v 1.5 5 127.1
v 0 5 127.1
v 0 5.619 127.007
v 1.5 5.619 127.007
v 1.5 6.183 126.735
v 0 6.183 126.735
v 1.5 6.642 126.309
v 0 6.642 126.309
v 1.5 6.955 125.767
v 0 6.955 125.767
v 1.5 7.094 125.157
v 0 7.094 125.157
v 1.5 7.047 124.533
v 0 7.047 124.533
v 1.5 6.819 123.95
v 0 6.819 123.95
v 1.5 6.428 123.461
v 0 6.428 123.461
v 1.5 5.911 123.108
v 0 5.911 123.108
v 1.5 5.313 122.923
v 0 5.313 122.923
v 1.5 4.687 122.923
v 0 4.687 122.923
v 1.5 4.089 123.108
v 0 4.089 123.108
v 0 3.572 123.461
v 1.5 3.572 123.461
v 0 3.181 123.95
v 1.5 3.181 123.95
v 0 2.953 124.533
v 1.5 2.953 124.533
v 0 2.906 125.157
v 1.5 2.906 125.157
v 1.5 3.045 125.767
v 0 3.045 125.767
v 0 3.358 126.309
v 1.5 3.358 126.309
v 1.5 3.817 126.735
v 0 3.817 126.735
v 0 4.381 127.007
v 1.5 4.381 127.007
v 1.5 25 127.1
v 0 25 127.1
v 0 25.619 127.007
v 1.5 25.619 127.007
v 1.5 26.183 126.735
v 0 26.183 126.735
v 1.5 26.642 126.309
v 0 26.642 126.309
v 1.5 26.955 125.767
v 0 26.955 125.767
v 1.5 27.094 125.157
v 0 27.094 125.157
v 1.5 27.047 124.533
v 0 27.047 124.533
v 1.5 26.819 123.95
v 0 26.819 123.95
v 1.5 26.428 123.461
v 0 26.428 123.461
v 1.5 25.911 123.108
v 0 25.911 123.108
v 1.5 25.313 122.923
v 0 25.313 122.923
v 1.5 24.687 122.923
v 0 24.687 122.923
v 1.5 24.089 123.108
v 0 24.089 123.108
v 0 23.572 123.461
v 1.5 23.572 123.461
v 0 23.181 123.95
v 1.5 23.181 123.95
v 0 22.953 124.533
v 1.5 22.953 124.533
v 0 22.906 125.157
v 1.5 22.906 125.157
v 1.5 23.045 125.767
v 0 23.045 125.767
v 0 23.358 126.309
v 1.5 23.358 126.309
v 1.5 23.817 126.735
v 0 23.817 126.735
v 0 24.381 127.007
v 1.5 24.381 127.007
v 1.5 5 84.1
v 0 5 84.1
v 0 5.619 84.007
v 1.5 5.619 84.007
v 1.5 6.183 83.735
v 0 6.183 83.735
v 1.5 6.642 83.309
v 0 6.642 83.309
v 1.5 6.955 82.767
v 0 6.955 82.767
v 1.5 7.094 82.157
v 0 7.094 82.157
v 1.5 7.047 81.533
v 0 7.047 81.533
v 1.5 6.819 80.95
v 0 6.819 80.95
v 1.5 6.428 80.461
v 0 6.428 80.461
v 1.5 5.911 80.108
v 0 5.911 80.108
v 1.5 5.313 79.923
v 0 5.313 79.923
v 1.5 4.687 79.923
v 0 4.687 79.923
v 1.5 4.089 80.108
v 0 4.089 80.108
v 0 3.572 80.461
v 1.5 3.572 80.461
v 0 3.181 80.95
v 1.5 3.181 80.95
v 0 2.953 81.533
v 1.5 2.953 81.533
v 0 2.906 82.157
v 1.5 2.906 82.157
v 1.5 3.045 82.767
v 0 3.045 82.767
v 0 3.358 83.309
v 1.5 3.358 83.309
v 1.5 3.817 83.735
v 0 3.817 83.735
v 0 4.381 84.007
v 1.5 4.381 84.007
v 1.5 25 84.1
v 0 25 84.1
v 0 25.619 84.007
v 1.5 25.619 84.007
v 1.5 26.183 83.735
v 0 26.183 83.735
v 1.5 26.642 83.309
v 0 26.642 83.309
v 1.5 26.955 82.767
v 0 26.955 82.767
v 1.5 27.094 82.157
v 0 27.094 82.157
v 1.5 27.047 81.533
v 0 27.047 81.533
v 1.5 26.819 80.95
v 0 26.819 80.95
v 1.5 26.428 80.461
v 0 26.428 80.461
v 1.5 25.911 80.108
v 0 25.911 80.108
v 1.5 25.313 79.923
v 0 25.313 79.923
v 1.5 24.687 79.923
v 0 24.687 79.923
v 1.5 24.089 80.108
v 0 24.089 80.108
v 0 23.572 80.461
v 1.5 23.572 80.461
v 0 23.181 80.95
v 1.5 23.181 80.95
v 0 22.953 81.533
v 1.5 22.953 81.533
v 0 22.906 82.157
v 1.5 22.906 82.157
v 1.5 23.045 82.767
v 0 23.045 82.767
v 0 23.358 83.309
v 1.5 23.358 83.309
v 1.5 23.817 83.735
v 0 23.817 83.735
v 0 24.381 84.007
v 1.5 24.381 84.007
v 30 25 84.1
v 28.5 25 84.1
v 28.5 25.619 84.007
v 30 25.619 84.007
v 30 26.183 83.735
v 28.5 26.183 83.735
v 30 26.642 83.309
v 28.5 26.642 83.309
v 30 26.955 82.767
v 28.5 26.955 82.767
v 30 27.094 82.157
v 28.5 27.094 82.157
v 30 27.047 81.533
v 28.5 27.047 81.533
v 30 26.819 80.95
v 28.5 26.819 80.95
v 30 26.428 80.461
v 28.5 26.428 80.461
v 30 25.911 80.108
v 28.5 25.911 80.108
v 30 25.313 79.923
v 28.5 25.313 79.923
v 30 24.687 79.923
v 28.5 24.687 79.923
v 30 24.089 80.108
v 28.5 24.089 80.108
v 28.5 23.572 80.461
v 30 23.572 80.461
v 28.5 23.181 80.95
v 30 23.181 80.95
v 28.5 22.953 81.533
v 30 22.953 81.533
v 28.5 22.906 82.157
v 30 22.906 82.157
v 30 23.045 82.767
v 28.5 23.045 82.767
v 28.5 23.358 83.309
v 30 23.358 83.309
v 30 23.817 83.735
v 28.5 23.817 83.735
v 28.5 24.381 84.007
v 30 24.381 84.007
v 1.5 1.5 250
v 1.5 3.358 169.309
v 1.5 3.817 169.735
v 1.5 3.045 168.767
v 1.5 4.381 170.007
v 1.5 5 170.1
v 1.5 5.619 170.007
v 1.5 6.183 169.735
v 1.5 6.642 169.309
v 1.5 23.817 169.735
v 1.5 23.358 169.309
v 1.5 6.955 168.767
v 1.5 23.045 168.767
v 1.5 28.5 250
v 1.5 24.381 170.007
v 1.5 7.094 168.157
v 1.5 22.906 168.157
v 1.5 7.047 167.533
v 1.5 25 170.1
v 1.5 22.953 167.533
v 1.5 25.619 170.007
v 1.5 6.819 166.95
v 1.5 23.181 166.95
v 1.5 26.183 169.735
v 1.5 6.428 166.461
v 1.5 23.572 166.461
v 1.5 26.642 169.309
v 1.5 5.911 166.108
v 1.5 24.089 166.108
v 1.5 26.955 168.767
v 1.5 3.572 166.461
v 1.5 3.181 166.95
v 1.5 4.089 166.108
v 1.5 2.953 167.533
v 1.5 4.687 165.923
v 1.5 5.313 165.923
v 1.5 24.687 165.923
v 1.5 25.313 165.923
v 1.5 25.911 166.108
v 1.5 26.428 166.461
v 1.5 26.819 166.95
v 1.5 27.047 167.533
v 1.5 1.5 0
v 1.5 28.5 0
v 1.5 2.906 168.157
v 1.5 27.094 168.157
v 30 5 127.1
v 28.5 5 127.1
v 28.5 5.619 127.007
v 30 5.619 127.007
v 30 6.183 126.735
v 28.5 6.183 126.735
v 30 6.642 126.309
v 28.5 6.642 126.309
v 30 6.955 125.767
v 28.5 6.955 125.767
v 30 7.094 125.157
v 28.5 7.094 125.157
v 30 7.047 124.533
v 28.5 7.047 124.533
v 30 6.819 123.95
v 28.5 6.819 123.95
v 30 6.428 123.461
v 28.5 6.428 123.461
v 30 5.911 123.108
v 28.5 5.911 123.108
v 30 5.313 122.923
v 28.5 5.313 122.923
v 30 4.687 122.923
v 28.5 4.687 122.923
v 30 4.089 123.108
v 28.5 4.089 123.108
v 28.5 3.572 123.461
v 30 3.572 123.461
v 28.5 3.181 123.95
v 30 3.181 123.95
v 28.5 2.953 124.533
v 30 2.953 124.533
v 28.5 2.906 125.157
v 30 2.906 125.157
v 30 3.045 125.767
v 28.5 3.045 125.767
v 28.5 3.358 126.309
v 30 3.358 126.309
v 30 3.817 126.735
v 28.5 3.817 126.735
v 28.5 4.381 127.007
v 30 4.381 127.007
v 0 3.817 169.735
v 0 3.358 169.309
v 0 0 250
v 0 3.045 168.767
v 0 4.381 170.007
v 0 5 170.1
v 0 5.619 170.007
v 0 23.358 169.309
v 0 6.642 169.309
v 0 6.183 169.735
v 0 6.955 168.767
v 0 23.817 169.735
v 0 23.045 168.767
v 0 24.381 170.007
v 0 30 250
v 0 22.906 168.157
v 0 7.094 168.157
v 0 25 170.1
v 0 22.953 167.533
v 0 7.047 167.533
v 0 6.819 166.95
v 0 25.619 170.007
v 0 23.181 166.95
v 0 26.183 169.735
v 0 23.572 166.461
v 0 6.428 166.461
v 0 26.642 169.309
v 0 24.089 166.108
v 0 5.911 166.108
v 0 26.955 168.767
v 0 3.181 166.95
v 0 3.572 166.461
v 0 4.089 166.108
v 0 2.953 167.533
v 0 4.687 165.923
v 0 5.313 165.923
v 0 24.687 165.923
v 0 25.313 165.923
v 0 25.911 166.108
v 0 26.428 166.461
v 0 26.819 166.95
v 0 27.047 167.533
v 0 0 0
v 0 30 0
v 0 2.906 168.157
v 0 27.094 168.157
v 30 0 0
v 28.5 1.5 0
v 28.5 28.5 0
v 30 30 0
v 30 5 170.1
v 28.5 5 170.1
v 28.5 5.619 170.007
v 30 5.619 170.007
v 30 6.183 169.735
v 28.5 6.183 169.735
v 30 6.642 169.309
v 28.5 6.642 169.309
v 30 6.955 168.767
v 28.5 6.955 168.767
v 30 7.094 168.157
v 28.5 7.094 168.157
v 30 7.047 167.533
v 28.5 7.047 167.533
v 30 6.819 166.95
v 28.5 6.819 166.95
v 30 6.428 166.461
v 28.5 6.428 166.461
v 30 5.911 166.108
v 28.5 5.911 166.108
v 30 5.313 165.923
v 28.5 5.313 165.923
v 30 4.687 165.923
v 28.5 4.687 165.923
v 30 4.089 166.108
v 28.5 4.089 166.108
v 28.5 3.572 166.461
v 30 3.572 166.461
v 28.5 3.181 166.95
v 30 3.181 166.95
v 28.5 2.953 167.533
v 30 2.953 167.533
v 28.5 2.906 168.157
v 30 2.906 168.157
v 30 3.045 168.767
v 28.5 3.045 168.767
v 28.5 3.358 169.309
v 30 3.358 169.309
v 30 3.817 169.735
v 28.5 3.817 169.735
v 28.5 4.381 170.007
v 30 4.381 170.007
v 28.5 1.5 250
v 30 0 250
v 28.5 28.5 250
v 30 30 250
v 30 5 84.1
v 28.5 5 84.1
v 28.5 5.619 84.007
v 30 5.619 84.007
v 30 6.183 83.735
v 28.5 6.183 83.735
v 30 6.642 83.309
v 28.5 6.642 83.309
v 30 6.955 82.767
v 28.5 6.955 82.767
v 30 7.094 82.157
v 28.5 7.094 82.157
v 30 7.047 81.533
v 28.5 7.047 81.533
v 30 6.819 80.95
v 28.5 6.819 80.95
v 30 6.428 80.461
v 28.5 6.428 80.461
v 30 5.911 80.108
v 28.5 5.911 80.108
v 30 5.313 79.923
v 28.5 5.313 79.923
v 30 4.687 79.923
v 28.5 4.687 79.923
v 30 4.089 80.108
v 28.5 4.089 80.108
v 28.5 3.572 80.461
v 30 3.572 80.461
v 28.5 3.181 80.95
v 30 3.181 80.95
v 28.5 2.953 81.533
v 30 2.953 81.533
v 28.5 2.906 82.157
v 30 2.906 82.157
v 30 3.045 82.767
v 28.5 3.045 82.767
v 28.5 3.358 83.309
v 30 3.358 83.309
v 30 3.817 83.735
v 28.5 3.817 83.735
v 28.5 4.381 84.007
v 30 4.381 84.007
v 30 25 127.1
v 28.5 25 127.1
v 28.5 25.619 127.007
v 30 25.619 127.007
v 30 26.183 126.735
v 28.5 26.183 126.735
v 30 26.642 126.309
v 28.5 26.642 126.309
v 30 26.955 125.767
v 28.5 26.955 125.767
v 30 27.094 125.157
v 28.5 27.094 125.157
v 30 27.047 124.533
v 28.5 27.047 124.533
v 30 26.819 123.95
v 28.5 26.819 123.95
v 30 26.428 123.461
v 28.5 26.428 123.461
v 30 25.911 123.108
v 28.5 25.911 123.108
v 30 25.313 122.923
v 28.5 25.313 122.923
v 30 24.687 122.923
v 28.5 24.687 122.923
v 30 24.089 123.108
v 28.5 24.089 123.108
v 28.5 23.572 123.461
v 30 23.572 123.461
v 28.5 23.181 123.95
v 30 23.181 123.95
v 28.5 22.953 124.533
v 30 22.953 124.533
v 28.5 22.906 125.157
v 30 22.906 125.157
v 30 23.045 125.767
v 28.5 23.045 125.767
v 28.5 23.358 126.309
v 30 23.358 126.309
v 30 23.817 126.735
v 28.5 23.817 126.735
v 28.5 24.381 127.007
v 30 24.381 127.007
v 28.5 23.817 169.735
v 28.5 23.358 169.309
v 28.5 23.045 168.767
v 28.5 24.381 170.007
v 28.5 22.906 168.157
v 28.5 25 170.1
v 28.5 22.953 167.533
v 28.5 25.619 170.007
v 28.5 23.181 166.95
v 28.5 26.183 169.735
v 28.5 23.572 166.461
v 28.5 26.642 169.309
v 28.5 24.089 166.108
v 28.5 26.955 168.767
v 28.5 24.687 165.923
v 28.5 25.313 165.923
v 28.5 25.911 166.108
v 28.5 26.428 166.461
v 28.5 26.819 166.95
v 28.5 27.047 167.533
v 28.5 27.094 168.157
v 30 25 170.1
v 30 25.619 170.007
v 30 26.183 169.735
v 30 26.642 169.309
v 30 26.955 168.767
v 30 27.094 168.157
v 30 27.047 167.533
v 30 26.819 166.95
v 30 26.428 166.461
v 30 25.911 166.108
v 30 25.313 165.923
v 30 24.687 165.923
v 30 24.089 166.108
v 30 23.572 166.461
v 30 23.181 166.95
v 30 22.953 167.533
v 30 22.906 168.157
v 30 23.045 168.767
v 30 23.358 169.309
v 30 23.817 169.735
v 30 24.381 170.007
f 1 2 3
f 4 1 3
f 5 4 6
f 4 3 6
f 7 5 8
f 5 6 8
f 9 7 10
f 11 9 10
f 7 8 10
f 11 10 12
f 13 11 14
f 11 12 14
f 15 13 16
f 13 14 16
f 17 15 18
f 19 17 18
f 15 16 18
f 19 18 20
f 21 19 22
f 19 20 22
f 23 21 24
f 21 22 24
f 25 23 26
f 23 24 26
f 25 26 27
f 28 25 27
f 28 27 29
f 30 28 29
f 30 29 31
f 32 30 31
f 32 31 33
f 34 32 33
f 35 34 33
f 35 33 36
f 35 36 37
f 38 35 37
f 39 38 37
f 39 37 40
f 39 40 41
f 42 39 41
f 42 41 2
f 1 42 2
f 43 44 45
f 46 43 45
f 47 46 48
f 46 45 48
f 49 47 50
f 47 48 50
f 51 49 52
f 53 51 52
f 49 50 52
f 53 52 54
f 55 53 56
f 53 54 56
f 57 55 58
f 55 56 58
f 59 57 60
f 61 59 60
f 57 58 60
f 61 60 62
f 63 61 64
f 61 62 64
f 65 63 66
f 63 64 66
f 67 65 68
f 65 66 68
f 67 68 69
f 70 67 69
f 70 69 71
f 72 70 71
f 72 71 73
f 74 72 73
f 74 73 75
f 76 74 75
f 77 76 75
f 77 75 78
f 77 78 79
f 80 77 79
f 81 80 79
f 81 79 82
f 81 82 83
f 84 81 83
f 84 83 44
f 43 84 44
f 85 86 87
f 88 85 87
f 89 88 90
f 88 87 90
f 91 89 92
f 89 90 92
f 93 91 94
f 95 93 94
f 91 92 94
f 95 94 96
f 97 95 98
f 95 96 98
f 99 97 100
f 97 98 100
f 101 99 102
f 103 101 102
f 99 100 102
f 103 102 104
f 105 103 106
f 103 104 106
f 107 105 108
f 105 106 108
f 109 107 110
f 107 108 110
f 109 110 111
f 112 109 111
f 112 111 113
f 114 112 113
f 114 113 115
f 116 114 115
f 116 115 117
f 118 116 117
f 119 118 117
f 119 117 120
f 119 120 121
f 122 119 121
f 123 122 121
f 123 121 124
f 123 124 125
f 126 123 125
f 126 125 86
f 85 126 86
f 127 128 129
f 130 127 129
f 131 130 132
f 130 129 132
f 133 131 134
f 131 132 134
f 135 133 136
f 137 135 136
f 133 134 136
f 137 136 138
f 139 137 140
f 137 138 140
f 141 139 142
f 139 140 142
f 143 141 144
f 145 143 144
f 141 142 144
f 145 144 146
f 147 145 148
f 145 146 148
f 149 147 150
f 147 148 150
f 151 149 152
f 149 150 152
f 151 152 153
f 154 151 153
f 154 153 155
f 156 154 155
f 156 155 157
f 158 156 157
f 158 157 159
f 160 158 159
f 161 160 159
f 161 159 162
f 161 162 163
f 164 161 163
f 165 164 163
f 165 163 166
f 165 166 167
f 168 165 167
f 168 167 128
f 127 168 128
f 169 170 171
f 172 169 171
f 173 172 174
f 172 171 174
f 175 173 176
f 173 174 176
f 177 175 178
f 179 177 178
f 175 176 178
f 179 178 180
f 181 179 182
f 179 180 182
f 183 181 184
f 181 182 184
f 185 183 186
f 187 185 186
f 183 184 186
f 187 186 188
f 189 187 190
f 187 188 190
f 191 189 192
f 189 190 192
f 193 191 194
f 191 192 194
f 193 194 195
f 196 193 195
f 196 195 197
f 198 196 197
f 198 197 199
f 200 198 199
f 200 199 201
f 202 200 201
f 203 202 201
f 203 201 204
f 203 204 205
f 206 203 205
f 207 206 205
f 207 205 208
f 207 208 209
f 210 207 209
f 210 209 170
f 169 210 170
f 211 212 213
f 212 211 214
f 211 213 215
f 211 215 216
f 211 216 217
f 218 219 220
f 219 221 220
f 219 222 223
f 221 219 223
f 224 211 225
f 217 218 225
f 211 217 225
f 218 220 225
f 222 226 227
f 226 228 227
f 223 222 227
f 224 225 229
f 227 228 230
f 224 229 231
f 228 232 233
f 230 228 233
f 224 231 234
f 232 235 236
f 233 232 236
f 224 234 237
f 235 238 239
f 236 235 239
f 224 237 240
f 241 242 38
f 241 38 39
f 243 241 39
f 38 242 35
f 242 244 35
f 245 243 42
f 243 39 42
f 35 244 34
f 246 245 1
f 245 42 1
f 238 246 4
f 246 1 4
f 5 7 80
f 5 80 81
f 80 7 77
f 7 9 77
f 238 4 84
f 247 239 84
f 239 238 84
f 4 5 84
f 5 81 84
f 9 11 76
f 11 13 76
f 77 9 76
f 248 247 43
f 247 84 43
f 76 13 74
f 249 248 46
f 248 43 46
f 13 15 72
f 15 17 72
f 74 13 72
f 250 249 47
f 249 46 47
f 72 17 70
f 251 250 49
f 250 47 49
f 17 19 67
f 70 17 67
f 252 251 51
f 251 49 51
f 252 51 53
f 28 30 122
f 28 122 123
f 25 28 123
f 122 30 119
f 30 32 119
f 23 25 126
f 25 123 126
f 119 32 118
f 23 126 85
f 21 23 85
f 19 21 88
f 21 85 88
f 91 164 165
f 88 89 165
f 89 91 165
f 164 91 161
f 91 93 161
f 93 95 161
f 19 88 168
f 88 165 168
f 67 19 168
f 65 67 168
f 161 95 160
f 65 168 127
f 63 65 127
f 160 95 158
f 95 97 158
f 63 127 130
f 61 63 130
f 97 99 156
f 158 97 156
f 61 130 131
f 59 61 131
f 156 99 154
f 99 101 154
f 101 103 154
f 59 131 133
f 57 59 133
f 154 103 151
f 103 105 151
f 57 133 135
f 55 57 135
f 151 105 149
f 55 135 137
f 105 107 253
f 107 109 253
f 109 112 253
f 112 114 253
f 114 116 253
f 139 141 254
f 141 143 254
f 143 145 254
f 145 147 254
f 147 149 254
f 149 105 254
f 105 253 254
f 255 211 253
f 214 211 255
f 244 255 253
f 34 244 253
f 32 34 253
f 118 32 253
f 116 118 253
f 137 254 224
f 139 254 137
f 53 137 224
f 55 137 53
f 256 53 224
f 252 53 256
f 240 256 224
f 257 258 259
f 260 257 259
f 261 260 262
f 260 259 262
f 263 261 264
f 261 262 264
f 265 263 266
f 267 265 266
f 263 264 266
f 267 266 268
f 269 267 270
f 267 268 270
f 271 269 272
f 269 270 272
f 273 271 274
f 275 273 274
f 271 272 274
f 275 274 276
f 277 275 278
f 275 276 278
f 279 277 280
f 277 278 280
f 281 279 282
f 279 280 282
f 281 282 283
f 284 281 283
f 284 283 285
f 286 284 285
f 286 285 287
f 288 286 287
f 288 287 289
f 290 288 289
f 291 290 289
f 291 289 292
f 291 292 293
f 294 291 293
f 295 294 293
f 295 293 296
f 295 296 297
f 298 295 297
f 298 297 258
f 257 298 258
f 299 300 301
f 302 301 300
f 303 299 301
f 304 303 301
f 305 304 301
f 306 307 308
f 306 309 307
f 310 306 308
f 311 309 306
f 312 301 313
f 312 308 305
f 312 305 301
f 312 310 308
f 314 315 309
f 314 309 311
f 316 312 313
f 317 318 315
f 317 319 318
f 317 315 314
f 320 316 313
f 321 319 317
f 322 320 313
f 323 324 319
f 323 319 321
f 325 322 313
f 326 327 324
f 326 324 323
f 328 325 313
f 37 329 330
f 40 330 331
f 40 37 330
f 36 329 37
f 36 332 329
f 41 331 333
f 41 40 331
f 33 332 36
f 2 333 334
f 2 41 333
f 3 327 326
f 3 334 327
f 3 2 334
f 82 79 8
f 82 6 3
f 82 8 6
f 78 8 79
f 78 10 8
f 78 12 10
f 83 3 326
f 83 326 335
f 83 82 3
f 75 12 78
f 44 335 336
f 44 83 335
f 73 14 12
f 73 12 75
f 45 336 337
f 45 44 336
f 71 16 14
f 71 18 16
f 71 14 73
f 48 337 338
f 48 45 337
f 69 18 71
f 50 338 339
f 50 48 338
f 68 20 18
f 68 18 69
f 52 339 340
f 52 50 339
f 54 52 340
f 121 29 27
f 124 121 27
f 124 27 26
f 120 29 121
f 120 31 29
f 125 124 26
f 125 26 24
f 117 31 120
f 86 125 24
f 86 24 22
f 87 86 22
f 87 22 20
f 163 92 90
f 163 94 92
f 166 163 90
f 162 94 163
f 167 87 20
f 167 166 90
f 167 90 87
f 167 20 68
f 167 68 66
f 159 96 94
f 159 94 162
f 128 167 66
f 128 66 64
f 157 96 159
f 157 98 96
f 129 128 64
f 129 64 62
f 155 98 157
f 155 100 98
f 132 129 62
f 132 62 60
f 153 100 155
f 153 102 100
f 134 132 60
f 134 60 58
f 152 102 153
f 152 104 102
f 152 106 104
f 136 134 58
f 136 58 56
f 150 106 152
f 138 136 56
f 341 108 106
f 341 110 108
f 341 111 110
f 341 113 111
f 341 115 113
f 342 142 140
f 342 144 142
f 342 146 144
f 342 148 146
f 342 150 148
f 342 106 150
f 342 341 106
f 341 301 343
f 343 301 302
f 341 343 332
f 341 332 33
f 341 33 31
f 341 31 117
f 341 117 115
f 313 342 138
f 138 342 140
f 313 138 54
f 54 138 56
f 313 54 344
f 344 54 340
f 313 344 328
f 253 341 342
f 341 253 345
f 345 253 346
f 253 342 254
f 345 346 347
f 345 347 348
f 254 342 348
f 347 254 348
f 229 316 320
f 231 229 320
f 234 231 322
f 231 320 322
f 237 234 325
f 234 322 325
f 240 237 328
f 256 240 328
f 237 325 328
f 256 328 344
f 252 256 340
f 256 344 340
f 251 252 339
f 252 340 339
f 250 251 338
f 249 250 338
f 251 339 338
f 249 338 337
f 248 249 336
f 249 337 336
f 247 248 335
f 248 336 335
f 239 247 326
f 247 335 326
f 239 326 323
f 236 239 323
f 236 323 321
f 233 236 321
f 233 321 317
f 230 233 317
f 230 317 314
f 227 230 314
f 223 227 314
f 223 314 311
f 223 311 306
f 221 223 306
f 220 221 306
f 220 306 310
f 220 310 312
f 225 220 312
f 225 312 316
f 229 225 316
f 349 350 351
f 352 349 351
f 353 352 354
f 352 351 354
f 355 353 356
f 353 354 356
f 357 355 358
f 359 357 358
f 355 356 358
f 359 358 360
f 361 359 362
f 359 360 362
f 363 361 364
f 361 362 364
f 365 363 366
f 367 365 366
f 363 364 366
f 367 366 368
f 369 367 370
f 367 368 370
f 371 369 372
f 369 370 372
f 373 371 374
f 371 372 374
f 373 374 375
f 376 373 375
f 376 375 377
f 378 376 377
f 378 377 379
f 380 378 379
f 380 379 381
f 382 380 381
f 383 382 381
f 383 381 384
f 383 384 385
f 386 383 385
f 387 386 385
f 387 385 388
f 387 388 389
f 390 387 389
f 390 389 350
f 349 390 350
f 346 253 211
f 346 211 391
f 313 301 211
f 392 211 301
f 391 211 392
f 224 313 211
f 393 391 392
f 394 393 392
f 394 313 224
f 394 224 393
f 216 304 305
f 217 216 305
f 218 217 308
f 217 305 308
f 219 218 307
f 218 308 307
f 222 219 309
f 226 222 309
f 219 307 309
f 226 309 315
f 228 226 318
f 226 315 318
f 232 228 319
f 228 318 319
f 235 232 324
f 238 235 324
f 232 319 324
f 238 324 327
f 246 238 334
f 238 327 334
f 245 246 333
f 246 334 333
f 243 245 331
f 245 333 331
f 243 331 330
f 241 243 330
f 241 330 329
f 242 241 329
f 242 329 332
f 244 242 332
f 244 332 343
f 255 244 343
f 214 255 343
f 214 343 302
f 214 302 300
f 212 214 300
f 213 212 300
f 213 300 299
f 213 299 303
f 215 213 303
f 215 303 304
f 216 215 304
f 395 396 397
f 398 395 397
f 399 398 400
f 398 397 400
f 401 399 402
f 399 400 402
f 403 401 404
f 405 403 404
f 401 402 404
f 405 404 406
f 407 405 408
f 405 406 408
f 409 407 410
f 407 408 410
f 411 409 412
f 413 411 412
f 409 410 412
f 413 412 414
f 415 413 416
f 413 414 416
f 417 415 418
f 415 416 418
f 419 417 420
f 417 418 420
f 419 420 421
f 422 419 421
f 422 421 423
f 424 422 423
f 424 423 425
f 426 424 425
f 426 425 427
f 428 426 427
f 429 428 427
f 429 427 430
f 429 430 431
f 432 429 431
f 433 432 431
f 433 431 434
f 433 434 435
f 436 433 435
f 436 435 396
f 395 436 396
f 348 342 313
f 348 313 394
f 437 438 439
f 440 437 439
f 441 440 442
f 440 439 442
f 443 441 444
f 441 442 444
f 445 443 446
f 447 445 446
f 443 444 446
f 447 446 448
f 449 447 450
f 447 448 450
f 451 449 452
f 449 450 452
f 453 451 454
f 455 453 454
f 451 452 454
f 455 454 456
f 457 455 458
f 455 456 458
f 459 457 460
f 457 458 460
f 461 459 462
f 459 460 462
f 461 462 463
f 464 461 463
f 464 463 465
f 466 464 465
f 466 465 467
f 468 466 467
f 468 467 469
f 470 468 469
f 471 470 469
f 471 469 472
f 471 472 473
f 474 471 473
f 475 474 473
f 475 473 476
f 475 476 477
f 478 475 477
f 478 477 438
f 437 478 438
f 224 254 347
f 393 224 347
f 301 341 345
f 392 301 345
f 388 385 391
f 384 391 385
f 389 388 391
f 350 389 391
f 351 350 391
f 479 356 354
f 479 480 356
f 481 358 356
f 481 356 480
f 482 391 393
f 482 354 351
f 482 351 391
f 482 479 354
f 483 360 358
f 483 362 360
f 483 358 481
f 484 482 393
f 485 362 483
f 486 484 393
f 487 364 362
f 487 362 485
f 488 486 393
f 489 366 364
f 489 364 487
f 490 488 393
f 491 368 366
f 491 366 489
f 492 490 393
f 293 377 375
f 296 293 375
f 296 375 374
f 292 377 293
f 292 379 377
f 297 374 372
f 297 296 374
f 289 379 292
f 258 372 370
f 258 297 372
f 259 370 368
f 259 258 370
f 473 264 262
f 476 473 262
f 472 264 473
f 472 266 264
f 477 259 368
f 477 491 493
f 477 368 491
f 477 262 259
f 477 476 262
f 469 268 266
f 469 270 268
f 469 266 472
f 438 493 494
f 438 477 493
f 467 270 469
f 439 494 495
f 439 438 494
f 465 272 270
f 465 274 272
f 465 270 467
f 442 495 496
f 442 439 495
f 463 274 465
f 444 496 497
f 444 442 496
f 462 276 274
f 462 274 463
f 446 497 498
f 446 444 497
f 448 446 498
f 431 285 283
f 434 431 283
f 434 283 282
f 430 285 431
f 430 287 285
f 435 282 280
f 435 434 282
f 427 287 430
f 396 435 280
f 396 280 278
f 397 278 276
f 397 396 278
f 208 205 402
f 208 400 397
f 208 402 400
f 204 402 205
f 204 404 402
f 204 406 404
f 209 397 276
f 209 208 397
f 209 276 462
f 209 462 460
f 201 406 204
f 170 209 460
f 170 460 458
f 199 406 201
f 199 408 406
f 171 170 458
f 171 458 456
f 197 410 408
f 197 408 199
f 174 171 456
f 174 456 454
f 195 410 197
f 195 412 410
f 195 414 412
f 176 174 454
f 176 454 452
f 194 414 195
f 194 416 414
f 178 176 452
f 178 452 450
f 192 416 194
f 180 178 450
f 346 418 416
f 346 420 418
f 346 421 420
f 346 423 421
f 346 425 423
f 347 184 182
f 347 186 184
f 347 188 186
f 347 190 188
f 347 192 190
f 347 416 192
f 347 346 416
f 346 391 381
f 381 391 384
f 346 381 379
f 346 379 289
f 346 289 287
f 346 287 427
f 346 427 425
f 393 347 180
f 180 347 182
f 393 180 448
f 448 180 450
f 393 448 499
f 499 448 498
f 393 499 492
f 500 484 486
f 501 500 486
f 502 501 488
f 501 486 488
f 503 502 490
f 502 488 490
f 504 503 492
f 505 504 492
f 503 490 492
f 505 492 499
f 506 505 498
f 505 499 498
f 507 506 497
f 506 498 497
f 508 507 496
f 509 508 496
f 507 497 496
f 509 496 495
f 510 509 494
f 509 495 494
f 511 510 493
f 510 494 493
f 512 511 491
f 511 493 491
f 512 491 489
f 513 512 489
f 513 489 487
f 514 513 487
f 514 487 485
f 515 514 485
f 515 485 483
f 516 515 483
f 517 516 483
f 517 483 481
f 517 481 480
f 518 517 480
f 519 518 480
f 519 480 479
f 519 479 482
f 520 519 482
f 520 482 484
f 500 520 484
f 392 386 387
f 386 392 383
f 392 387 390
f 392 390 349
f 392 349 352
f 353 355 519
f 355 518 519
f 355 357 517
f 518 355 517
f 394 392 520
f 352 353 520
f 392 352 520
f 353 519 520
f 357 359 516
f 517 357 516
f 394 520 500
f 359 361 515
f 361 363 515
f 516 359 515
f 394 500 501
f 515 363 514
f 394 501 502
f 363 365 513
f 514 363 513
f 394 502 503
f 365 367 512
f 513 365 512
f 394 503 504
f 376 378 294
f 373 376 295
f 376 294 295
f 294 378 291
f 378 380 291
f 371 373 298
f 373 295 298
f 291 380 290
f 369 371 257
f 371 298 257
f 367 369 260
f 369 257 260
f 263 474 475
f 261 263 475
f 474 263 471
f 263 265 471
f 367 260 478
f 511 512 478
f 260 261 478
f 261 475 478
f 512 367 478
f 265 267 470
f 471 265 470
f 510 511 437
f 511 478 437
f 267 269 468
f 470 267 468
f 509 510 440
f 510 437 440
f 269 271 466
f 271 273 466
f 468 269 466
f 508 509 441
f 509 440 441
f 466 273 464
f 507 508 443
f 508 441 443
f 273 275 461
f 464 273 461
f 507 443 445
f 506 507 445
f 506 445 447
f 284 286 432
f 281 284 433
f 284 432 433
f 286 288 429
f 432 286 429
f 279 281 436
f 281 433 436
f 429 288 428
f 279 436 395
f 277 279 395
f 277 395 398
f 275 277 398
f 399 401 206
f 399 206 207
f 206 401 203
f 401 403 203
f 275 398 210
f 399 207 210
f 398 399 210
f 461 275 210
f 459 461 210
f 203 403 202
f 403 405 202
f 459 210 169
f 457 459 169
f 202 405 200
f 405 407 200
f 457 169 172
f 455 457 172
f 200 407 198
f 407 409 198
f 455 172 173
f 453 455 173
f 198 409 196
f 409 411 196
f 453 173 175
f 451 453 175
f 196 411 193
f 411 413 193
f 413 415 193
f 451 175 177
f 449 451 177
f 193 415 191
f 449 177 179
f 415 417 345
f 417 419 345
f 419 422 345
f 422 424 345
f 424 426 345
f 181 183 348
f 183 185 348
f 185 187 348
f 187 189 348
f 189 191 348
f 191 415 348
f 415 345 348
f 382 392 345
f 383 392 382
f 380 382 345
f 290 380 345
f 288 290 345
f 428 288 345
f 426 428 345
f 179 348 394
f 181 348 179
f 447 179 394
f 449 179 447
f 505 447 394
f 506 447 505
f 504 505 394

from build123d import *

# Parameters (mm, degrees)
SKETCH1_W           = 30
SKETCH1_H           = 30
SKETCH1_W_2         = 27
SKETCH1_H_2         = 27
BOSS_EXTRUDE1_DEPTH = 250
SKETCH2_R           = 2.1
CUT_EXTRUDE1_DEPTH  = 254.574446662


with BuildPart() as part:
    # Sketch1 → Boss-Extrude1 (new body)
    with BuildSketch(Plane.XY):
        with Locations((15, 15)):
            Rectangle(SKETCH1_W, SKETCH1_H)
        with Locations((15, 15)):
            Rectangle(SKETCH1_W_2, SKETCH1_H_2, mode=Mode.SUBTRACT)
    extrude(amount=BOSS_EXTRUDE1_DEPTH)

    # Sketch2 → Cut-Extrude1 (cut, through all)
    with BuildSketch(Plane.ZY):
        with Locations((125, 25)):
            Circle(SKETCH2_R)
        with Locations((125, 5)):
            Circle(SKETCH2_R)
        with Locations((168, 25)):
            Circle(SKETCH2_R)
        with Locations((168, 5)):
            Circle(SKETCH2_R)
        with Locations((82, 5)):
            Circle(SKETCH2_R)
        with Locations((82, 25)):
            Circle(SKETCH2_R)
    extrude(amount=-CUT_EXTRUDE1_DEPTH, mode=Mode.SUBTRACT)


solid = part.part
